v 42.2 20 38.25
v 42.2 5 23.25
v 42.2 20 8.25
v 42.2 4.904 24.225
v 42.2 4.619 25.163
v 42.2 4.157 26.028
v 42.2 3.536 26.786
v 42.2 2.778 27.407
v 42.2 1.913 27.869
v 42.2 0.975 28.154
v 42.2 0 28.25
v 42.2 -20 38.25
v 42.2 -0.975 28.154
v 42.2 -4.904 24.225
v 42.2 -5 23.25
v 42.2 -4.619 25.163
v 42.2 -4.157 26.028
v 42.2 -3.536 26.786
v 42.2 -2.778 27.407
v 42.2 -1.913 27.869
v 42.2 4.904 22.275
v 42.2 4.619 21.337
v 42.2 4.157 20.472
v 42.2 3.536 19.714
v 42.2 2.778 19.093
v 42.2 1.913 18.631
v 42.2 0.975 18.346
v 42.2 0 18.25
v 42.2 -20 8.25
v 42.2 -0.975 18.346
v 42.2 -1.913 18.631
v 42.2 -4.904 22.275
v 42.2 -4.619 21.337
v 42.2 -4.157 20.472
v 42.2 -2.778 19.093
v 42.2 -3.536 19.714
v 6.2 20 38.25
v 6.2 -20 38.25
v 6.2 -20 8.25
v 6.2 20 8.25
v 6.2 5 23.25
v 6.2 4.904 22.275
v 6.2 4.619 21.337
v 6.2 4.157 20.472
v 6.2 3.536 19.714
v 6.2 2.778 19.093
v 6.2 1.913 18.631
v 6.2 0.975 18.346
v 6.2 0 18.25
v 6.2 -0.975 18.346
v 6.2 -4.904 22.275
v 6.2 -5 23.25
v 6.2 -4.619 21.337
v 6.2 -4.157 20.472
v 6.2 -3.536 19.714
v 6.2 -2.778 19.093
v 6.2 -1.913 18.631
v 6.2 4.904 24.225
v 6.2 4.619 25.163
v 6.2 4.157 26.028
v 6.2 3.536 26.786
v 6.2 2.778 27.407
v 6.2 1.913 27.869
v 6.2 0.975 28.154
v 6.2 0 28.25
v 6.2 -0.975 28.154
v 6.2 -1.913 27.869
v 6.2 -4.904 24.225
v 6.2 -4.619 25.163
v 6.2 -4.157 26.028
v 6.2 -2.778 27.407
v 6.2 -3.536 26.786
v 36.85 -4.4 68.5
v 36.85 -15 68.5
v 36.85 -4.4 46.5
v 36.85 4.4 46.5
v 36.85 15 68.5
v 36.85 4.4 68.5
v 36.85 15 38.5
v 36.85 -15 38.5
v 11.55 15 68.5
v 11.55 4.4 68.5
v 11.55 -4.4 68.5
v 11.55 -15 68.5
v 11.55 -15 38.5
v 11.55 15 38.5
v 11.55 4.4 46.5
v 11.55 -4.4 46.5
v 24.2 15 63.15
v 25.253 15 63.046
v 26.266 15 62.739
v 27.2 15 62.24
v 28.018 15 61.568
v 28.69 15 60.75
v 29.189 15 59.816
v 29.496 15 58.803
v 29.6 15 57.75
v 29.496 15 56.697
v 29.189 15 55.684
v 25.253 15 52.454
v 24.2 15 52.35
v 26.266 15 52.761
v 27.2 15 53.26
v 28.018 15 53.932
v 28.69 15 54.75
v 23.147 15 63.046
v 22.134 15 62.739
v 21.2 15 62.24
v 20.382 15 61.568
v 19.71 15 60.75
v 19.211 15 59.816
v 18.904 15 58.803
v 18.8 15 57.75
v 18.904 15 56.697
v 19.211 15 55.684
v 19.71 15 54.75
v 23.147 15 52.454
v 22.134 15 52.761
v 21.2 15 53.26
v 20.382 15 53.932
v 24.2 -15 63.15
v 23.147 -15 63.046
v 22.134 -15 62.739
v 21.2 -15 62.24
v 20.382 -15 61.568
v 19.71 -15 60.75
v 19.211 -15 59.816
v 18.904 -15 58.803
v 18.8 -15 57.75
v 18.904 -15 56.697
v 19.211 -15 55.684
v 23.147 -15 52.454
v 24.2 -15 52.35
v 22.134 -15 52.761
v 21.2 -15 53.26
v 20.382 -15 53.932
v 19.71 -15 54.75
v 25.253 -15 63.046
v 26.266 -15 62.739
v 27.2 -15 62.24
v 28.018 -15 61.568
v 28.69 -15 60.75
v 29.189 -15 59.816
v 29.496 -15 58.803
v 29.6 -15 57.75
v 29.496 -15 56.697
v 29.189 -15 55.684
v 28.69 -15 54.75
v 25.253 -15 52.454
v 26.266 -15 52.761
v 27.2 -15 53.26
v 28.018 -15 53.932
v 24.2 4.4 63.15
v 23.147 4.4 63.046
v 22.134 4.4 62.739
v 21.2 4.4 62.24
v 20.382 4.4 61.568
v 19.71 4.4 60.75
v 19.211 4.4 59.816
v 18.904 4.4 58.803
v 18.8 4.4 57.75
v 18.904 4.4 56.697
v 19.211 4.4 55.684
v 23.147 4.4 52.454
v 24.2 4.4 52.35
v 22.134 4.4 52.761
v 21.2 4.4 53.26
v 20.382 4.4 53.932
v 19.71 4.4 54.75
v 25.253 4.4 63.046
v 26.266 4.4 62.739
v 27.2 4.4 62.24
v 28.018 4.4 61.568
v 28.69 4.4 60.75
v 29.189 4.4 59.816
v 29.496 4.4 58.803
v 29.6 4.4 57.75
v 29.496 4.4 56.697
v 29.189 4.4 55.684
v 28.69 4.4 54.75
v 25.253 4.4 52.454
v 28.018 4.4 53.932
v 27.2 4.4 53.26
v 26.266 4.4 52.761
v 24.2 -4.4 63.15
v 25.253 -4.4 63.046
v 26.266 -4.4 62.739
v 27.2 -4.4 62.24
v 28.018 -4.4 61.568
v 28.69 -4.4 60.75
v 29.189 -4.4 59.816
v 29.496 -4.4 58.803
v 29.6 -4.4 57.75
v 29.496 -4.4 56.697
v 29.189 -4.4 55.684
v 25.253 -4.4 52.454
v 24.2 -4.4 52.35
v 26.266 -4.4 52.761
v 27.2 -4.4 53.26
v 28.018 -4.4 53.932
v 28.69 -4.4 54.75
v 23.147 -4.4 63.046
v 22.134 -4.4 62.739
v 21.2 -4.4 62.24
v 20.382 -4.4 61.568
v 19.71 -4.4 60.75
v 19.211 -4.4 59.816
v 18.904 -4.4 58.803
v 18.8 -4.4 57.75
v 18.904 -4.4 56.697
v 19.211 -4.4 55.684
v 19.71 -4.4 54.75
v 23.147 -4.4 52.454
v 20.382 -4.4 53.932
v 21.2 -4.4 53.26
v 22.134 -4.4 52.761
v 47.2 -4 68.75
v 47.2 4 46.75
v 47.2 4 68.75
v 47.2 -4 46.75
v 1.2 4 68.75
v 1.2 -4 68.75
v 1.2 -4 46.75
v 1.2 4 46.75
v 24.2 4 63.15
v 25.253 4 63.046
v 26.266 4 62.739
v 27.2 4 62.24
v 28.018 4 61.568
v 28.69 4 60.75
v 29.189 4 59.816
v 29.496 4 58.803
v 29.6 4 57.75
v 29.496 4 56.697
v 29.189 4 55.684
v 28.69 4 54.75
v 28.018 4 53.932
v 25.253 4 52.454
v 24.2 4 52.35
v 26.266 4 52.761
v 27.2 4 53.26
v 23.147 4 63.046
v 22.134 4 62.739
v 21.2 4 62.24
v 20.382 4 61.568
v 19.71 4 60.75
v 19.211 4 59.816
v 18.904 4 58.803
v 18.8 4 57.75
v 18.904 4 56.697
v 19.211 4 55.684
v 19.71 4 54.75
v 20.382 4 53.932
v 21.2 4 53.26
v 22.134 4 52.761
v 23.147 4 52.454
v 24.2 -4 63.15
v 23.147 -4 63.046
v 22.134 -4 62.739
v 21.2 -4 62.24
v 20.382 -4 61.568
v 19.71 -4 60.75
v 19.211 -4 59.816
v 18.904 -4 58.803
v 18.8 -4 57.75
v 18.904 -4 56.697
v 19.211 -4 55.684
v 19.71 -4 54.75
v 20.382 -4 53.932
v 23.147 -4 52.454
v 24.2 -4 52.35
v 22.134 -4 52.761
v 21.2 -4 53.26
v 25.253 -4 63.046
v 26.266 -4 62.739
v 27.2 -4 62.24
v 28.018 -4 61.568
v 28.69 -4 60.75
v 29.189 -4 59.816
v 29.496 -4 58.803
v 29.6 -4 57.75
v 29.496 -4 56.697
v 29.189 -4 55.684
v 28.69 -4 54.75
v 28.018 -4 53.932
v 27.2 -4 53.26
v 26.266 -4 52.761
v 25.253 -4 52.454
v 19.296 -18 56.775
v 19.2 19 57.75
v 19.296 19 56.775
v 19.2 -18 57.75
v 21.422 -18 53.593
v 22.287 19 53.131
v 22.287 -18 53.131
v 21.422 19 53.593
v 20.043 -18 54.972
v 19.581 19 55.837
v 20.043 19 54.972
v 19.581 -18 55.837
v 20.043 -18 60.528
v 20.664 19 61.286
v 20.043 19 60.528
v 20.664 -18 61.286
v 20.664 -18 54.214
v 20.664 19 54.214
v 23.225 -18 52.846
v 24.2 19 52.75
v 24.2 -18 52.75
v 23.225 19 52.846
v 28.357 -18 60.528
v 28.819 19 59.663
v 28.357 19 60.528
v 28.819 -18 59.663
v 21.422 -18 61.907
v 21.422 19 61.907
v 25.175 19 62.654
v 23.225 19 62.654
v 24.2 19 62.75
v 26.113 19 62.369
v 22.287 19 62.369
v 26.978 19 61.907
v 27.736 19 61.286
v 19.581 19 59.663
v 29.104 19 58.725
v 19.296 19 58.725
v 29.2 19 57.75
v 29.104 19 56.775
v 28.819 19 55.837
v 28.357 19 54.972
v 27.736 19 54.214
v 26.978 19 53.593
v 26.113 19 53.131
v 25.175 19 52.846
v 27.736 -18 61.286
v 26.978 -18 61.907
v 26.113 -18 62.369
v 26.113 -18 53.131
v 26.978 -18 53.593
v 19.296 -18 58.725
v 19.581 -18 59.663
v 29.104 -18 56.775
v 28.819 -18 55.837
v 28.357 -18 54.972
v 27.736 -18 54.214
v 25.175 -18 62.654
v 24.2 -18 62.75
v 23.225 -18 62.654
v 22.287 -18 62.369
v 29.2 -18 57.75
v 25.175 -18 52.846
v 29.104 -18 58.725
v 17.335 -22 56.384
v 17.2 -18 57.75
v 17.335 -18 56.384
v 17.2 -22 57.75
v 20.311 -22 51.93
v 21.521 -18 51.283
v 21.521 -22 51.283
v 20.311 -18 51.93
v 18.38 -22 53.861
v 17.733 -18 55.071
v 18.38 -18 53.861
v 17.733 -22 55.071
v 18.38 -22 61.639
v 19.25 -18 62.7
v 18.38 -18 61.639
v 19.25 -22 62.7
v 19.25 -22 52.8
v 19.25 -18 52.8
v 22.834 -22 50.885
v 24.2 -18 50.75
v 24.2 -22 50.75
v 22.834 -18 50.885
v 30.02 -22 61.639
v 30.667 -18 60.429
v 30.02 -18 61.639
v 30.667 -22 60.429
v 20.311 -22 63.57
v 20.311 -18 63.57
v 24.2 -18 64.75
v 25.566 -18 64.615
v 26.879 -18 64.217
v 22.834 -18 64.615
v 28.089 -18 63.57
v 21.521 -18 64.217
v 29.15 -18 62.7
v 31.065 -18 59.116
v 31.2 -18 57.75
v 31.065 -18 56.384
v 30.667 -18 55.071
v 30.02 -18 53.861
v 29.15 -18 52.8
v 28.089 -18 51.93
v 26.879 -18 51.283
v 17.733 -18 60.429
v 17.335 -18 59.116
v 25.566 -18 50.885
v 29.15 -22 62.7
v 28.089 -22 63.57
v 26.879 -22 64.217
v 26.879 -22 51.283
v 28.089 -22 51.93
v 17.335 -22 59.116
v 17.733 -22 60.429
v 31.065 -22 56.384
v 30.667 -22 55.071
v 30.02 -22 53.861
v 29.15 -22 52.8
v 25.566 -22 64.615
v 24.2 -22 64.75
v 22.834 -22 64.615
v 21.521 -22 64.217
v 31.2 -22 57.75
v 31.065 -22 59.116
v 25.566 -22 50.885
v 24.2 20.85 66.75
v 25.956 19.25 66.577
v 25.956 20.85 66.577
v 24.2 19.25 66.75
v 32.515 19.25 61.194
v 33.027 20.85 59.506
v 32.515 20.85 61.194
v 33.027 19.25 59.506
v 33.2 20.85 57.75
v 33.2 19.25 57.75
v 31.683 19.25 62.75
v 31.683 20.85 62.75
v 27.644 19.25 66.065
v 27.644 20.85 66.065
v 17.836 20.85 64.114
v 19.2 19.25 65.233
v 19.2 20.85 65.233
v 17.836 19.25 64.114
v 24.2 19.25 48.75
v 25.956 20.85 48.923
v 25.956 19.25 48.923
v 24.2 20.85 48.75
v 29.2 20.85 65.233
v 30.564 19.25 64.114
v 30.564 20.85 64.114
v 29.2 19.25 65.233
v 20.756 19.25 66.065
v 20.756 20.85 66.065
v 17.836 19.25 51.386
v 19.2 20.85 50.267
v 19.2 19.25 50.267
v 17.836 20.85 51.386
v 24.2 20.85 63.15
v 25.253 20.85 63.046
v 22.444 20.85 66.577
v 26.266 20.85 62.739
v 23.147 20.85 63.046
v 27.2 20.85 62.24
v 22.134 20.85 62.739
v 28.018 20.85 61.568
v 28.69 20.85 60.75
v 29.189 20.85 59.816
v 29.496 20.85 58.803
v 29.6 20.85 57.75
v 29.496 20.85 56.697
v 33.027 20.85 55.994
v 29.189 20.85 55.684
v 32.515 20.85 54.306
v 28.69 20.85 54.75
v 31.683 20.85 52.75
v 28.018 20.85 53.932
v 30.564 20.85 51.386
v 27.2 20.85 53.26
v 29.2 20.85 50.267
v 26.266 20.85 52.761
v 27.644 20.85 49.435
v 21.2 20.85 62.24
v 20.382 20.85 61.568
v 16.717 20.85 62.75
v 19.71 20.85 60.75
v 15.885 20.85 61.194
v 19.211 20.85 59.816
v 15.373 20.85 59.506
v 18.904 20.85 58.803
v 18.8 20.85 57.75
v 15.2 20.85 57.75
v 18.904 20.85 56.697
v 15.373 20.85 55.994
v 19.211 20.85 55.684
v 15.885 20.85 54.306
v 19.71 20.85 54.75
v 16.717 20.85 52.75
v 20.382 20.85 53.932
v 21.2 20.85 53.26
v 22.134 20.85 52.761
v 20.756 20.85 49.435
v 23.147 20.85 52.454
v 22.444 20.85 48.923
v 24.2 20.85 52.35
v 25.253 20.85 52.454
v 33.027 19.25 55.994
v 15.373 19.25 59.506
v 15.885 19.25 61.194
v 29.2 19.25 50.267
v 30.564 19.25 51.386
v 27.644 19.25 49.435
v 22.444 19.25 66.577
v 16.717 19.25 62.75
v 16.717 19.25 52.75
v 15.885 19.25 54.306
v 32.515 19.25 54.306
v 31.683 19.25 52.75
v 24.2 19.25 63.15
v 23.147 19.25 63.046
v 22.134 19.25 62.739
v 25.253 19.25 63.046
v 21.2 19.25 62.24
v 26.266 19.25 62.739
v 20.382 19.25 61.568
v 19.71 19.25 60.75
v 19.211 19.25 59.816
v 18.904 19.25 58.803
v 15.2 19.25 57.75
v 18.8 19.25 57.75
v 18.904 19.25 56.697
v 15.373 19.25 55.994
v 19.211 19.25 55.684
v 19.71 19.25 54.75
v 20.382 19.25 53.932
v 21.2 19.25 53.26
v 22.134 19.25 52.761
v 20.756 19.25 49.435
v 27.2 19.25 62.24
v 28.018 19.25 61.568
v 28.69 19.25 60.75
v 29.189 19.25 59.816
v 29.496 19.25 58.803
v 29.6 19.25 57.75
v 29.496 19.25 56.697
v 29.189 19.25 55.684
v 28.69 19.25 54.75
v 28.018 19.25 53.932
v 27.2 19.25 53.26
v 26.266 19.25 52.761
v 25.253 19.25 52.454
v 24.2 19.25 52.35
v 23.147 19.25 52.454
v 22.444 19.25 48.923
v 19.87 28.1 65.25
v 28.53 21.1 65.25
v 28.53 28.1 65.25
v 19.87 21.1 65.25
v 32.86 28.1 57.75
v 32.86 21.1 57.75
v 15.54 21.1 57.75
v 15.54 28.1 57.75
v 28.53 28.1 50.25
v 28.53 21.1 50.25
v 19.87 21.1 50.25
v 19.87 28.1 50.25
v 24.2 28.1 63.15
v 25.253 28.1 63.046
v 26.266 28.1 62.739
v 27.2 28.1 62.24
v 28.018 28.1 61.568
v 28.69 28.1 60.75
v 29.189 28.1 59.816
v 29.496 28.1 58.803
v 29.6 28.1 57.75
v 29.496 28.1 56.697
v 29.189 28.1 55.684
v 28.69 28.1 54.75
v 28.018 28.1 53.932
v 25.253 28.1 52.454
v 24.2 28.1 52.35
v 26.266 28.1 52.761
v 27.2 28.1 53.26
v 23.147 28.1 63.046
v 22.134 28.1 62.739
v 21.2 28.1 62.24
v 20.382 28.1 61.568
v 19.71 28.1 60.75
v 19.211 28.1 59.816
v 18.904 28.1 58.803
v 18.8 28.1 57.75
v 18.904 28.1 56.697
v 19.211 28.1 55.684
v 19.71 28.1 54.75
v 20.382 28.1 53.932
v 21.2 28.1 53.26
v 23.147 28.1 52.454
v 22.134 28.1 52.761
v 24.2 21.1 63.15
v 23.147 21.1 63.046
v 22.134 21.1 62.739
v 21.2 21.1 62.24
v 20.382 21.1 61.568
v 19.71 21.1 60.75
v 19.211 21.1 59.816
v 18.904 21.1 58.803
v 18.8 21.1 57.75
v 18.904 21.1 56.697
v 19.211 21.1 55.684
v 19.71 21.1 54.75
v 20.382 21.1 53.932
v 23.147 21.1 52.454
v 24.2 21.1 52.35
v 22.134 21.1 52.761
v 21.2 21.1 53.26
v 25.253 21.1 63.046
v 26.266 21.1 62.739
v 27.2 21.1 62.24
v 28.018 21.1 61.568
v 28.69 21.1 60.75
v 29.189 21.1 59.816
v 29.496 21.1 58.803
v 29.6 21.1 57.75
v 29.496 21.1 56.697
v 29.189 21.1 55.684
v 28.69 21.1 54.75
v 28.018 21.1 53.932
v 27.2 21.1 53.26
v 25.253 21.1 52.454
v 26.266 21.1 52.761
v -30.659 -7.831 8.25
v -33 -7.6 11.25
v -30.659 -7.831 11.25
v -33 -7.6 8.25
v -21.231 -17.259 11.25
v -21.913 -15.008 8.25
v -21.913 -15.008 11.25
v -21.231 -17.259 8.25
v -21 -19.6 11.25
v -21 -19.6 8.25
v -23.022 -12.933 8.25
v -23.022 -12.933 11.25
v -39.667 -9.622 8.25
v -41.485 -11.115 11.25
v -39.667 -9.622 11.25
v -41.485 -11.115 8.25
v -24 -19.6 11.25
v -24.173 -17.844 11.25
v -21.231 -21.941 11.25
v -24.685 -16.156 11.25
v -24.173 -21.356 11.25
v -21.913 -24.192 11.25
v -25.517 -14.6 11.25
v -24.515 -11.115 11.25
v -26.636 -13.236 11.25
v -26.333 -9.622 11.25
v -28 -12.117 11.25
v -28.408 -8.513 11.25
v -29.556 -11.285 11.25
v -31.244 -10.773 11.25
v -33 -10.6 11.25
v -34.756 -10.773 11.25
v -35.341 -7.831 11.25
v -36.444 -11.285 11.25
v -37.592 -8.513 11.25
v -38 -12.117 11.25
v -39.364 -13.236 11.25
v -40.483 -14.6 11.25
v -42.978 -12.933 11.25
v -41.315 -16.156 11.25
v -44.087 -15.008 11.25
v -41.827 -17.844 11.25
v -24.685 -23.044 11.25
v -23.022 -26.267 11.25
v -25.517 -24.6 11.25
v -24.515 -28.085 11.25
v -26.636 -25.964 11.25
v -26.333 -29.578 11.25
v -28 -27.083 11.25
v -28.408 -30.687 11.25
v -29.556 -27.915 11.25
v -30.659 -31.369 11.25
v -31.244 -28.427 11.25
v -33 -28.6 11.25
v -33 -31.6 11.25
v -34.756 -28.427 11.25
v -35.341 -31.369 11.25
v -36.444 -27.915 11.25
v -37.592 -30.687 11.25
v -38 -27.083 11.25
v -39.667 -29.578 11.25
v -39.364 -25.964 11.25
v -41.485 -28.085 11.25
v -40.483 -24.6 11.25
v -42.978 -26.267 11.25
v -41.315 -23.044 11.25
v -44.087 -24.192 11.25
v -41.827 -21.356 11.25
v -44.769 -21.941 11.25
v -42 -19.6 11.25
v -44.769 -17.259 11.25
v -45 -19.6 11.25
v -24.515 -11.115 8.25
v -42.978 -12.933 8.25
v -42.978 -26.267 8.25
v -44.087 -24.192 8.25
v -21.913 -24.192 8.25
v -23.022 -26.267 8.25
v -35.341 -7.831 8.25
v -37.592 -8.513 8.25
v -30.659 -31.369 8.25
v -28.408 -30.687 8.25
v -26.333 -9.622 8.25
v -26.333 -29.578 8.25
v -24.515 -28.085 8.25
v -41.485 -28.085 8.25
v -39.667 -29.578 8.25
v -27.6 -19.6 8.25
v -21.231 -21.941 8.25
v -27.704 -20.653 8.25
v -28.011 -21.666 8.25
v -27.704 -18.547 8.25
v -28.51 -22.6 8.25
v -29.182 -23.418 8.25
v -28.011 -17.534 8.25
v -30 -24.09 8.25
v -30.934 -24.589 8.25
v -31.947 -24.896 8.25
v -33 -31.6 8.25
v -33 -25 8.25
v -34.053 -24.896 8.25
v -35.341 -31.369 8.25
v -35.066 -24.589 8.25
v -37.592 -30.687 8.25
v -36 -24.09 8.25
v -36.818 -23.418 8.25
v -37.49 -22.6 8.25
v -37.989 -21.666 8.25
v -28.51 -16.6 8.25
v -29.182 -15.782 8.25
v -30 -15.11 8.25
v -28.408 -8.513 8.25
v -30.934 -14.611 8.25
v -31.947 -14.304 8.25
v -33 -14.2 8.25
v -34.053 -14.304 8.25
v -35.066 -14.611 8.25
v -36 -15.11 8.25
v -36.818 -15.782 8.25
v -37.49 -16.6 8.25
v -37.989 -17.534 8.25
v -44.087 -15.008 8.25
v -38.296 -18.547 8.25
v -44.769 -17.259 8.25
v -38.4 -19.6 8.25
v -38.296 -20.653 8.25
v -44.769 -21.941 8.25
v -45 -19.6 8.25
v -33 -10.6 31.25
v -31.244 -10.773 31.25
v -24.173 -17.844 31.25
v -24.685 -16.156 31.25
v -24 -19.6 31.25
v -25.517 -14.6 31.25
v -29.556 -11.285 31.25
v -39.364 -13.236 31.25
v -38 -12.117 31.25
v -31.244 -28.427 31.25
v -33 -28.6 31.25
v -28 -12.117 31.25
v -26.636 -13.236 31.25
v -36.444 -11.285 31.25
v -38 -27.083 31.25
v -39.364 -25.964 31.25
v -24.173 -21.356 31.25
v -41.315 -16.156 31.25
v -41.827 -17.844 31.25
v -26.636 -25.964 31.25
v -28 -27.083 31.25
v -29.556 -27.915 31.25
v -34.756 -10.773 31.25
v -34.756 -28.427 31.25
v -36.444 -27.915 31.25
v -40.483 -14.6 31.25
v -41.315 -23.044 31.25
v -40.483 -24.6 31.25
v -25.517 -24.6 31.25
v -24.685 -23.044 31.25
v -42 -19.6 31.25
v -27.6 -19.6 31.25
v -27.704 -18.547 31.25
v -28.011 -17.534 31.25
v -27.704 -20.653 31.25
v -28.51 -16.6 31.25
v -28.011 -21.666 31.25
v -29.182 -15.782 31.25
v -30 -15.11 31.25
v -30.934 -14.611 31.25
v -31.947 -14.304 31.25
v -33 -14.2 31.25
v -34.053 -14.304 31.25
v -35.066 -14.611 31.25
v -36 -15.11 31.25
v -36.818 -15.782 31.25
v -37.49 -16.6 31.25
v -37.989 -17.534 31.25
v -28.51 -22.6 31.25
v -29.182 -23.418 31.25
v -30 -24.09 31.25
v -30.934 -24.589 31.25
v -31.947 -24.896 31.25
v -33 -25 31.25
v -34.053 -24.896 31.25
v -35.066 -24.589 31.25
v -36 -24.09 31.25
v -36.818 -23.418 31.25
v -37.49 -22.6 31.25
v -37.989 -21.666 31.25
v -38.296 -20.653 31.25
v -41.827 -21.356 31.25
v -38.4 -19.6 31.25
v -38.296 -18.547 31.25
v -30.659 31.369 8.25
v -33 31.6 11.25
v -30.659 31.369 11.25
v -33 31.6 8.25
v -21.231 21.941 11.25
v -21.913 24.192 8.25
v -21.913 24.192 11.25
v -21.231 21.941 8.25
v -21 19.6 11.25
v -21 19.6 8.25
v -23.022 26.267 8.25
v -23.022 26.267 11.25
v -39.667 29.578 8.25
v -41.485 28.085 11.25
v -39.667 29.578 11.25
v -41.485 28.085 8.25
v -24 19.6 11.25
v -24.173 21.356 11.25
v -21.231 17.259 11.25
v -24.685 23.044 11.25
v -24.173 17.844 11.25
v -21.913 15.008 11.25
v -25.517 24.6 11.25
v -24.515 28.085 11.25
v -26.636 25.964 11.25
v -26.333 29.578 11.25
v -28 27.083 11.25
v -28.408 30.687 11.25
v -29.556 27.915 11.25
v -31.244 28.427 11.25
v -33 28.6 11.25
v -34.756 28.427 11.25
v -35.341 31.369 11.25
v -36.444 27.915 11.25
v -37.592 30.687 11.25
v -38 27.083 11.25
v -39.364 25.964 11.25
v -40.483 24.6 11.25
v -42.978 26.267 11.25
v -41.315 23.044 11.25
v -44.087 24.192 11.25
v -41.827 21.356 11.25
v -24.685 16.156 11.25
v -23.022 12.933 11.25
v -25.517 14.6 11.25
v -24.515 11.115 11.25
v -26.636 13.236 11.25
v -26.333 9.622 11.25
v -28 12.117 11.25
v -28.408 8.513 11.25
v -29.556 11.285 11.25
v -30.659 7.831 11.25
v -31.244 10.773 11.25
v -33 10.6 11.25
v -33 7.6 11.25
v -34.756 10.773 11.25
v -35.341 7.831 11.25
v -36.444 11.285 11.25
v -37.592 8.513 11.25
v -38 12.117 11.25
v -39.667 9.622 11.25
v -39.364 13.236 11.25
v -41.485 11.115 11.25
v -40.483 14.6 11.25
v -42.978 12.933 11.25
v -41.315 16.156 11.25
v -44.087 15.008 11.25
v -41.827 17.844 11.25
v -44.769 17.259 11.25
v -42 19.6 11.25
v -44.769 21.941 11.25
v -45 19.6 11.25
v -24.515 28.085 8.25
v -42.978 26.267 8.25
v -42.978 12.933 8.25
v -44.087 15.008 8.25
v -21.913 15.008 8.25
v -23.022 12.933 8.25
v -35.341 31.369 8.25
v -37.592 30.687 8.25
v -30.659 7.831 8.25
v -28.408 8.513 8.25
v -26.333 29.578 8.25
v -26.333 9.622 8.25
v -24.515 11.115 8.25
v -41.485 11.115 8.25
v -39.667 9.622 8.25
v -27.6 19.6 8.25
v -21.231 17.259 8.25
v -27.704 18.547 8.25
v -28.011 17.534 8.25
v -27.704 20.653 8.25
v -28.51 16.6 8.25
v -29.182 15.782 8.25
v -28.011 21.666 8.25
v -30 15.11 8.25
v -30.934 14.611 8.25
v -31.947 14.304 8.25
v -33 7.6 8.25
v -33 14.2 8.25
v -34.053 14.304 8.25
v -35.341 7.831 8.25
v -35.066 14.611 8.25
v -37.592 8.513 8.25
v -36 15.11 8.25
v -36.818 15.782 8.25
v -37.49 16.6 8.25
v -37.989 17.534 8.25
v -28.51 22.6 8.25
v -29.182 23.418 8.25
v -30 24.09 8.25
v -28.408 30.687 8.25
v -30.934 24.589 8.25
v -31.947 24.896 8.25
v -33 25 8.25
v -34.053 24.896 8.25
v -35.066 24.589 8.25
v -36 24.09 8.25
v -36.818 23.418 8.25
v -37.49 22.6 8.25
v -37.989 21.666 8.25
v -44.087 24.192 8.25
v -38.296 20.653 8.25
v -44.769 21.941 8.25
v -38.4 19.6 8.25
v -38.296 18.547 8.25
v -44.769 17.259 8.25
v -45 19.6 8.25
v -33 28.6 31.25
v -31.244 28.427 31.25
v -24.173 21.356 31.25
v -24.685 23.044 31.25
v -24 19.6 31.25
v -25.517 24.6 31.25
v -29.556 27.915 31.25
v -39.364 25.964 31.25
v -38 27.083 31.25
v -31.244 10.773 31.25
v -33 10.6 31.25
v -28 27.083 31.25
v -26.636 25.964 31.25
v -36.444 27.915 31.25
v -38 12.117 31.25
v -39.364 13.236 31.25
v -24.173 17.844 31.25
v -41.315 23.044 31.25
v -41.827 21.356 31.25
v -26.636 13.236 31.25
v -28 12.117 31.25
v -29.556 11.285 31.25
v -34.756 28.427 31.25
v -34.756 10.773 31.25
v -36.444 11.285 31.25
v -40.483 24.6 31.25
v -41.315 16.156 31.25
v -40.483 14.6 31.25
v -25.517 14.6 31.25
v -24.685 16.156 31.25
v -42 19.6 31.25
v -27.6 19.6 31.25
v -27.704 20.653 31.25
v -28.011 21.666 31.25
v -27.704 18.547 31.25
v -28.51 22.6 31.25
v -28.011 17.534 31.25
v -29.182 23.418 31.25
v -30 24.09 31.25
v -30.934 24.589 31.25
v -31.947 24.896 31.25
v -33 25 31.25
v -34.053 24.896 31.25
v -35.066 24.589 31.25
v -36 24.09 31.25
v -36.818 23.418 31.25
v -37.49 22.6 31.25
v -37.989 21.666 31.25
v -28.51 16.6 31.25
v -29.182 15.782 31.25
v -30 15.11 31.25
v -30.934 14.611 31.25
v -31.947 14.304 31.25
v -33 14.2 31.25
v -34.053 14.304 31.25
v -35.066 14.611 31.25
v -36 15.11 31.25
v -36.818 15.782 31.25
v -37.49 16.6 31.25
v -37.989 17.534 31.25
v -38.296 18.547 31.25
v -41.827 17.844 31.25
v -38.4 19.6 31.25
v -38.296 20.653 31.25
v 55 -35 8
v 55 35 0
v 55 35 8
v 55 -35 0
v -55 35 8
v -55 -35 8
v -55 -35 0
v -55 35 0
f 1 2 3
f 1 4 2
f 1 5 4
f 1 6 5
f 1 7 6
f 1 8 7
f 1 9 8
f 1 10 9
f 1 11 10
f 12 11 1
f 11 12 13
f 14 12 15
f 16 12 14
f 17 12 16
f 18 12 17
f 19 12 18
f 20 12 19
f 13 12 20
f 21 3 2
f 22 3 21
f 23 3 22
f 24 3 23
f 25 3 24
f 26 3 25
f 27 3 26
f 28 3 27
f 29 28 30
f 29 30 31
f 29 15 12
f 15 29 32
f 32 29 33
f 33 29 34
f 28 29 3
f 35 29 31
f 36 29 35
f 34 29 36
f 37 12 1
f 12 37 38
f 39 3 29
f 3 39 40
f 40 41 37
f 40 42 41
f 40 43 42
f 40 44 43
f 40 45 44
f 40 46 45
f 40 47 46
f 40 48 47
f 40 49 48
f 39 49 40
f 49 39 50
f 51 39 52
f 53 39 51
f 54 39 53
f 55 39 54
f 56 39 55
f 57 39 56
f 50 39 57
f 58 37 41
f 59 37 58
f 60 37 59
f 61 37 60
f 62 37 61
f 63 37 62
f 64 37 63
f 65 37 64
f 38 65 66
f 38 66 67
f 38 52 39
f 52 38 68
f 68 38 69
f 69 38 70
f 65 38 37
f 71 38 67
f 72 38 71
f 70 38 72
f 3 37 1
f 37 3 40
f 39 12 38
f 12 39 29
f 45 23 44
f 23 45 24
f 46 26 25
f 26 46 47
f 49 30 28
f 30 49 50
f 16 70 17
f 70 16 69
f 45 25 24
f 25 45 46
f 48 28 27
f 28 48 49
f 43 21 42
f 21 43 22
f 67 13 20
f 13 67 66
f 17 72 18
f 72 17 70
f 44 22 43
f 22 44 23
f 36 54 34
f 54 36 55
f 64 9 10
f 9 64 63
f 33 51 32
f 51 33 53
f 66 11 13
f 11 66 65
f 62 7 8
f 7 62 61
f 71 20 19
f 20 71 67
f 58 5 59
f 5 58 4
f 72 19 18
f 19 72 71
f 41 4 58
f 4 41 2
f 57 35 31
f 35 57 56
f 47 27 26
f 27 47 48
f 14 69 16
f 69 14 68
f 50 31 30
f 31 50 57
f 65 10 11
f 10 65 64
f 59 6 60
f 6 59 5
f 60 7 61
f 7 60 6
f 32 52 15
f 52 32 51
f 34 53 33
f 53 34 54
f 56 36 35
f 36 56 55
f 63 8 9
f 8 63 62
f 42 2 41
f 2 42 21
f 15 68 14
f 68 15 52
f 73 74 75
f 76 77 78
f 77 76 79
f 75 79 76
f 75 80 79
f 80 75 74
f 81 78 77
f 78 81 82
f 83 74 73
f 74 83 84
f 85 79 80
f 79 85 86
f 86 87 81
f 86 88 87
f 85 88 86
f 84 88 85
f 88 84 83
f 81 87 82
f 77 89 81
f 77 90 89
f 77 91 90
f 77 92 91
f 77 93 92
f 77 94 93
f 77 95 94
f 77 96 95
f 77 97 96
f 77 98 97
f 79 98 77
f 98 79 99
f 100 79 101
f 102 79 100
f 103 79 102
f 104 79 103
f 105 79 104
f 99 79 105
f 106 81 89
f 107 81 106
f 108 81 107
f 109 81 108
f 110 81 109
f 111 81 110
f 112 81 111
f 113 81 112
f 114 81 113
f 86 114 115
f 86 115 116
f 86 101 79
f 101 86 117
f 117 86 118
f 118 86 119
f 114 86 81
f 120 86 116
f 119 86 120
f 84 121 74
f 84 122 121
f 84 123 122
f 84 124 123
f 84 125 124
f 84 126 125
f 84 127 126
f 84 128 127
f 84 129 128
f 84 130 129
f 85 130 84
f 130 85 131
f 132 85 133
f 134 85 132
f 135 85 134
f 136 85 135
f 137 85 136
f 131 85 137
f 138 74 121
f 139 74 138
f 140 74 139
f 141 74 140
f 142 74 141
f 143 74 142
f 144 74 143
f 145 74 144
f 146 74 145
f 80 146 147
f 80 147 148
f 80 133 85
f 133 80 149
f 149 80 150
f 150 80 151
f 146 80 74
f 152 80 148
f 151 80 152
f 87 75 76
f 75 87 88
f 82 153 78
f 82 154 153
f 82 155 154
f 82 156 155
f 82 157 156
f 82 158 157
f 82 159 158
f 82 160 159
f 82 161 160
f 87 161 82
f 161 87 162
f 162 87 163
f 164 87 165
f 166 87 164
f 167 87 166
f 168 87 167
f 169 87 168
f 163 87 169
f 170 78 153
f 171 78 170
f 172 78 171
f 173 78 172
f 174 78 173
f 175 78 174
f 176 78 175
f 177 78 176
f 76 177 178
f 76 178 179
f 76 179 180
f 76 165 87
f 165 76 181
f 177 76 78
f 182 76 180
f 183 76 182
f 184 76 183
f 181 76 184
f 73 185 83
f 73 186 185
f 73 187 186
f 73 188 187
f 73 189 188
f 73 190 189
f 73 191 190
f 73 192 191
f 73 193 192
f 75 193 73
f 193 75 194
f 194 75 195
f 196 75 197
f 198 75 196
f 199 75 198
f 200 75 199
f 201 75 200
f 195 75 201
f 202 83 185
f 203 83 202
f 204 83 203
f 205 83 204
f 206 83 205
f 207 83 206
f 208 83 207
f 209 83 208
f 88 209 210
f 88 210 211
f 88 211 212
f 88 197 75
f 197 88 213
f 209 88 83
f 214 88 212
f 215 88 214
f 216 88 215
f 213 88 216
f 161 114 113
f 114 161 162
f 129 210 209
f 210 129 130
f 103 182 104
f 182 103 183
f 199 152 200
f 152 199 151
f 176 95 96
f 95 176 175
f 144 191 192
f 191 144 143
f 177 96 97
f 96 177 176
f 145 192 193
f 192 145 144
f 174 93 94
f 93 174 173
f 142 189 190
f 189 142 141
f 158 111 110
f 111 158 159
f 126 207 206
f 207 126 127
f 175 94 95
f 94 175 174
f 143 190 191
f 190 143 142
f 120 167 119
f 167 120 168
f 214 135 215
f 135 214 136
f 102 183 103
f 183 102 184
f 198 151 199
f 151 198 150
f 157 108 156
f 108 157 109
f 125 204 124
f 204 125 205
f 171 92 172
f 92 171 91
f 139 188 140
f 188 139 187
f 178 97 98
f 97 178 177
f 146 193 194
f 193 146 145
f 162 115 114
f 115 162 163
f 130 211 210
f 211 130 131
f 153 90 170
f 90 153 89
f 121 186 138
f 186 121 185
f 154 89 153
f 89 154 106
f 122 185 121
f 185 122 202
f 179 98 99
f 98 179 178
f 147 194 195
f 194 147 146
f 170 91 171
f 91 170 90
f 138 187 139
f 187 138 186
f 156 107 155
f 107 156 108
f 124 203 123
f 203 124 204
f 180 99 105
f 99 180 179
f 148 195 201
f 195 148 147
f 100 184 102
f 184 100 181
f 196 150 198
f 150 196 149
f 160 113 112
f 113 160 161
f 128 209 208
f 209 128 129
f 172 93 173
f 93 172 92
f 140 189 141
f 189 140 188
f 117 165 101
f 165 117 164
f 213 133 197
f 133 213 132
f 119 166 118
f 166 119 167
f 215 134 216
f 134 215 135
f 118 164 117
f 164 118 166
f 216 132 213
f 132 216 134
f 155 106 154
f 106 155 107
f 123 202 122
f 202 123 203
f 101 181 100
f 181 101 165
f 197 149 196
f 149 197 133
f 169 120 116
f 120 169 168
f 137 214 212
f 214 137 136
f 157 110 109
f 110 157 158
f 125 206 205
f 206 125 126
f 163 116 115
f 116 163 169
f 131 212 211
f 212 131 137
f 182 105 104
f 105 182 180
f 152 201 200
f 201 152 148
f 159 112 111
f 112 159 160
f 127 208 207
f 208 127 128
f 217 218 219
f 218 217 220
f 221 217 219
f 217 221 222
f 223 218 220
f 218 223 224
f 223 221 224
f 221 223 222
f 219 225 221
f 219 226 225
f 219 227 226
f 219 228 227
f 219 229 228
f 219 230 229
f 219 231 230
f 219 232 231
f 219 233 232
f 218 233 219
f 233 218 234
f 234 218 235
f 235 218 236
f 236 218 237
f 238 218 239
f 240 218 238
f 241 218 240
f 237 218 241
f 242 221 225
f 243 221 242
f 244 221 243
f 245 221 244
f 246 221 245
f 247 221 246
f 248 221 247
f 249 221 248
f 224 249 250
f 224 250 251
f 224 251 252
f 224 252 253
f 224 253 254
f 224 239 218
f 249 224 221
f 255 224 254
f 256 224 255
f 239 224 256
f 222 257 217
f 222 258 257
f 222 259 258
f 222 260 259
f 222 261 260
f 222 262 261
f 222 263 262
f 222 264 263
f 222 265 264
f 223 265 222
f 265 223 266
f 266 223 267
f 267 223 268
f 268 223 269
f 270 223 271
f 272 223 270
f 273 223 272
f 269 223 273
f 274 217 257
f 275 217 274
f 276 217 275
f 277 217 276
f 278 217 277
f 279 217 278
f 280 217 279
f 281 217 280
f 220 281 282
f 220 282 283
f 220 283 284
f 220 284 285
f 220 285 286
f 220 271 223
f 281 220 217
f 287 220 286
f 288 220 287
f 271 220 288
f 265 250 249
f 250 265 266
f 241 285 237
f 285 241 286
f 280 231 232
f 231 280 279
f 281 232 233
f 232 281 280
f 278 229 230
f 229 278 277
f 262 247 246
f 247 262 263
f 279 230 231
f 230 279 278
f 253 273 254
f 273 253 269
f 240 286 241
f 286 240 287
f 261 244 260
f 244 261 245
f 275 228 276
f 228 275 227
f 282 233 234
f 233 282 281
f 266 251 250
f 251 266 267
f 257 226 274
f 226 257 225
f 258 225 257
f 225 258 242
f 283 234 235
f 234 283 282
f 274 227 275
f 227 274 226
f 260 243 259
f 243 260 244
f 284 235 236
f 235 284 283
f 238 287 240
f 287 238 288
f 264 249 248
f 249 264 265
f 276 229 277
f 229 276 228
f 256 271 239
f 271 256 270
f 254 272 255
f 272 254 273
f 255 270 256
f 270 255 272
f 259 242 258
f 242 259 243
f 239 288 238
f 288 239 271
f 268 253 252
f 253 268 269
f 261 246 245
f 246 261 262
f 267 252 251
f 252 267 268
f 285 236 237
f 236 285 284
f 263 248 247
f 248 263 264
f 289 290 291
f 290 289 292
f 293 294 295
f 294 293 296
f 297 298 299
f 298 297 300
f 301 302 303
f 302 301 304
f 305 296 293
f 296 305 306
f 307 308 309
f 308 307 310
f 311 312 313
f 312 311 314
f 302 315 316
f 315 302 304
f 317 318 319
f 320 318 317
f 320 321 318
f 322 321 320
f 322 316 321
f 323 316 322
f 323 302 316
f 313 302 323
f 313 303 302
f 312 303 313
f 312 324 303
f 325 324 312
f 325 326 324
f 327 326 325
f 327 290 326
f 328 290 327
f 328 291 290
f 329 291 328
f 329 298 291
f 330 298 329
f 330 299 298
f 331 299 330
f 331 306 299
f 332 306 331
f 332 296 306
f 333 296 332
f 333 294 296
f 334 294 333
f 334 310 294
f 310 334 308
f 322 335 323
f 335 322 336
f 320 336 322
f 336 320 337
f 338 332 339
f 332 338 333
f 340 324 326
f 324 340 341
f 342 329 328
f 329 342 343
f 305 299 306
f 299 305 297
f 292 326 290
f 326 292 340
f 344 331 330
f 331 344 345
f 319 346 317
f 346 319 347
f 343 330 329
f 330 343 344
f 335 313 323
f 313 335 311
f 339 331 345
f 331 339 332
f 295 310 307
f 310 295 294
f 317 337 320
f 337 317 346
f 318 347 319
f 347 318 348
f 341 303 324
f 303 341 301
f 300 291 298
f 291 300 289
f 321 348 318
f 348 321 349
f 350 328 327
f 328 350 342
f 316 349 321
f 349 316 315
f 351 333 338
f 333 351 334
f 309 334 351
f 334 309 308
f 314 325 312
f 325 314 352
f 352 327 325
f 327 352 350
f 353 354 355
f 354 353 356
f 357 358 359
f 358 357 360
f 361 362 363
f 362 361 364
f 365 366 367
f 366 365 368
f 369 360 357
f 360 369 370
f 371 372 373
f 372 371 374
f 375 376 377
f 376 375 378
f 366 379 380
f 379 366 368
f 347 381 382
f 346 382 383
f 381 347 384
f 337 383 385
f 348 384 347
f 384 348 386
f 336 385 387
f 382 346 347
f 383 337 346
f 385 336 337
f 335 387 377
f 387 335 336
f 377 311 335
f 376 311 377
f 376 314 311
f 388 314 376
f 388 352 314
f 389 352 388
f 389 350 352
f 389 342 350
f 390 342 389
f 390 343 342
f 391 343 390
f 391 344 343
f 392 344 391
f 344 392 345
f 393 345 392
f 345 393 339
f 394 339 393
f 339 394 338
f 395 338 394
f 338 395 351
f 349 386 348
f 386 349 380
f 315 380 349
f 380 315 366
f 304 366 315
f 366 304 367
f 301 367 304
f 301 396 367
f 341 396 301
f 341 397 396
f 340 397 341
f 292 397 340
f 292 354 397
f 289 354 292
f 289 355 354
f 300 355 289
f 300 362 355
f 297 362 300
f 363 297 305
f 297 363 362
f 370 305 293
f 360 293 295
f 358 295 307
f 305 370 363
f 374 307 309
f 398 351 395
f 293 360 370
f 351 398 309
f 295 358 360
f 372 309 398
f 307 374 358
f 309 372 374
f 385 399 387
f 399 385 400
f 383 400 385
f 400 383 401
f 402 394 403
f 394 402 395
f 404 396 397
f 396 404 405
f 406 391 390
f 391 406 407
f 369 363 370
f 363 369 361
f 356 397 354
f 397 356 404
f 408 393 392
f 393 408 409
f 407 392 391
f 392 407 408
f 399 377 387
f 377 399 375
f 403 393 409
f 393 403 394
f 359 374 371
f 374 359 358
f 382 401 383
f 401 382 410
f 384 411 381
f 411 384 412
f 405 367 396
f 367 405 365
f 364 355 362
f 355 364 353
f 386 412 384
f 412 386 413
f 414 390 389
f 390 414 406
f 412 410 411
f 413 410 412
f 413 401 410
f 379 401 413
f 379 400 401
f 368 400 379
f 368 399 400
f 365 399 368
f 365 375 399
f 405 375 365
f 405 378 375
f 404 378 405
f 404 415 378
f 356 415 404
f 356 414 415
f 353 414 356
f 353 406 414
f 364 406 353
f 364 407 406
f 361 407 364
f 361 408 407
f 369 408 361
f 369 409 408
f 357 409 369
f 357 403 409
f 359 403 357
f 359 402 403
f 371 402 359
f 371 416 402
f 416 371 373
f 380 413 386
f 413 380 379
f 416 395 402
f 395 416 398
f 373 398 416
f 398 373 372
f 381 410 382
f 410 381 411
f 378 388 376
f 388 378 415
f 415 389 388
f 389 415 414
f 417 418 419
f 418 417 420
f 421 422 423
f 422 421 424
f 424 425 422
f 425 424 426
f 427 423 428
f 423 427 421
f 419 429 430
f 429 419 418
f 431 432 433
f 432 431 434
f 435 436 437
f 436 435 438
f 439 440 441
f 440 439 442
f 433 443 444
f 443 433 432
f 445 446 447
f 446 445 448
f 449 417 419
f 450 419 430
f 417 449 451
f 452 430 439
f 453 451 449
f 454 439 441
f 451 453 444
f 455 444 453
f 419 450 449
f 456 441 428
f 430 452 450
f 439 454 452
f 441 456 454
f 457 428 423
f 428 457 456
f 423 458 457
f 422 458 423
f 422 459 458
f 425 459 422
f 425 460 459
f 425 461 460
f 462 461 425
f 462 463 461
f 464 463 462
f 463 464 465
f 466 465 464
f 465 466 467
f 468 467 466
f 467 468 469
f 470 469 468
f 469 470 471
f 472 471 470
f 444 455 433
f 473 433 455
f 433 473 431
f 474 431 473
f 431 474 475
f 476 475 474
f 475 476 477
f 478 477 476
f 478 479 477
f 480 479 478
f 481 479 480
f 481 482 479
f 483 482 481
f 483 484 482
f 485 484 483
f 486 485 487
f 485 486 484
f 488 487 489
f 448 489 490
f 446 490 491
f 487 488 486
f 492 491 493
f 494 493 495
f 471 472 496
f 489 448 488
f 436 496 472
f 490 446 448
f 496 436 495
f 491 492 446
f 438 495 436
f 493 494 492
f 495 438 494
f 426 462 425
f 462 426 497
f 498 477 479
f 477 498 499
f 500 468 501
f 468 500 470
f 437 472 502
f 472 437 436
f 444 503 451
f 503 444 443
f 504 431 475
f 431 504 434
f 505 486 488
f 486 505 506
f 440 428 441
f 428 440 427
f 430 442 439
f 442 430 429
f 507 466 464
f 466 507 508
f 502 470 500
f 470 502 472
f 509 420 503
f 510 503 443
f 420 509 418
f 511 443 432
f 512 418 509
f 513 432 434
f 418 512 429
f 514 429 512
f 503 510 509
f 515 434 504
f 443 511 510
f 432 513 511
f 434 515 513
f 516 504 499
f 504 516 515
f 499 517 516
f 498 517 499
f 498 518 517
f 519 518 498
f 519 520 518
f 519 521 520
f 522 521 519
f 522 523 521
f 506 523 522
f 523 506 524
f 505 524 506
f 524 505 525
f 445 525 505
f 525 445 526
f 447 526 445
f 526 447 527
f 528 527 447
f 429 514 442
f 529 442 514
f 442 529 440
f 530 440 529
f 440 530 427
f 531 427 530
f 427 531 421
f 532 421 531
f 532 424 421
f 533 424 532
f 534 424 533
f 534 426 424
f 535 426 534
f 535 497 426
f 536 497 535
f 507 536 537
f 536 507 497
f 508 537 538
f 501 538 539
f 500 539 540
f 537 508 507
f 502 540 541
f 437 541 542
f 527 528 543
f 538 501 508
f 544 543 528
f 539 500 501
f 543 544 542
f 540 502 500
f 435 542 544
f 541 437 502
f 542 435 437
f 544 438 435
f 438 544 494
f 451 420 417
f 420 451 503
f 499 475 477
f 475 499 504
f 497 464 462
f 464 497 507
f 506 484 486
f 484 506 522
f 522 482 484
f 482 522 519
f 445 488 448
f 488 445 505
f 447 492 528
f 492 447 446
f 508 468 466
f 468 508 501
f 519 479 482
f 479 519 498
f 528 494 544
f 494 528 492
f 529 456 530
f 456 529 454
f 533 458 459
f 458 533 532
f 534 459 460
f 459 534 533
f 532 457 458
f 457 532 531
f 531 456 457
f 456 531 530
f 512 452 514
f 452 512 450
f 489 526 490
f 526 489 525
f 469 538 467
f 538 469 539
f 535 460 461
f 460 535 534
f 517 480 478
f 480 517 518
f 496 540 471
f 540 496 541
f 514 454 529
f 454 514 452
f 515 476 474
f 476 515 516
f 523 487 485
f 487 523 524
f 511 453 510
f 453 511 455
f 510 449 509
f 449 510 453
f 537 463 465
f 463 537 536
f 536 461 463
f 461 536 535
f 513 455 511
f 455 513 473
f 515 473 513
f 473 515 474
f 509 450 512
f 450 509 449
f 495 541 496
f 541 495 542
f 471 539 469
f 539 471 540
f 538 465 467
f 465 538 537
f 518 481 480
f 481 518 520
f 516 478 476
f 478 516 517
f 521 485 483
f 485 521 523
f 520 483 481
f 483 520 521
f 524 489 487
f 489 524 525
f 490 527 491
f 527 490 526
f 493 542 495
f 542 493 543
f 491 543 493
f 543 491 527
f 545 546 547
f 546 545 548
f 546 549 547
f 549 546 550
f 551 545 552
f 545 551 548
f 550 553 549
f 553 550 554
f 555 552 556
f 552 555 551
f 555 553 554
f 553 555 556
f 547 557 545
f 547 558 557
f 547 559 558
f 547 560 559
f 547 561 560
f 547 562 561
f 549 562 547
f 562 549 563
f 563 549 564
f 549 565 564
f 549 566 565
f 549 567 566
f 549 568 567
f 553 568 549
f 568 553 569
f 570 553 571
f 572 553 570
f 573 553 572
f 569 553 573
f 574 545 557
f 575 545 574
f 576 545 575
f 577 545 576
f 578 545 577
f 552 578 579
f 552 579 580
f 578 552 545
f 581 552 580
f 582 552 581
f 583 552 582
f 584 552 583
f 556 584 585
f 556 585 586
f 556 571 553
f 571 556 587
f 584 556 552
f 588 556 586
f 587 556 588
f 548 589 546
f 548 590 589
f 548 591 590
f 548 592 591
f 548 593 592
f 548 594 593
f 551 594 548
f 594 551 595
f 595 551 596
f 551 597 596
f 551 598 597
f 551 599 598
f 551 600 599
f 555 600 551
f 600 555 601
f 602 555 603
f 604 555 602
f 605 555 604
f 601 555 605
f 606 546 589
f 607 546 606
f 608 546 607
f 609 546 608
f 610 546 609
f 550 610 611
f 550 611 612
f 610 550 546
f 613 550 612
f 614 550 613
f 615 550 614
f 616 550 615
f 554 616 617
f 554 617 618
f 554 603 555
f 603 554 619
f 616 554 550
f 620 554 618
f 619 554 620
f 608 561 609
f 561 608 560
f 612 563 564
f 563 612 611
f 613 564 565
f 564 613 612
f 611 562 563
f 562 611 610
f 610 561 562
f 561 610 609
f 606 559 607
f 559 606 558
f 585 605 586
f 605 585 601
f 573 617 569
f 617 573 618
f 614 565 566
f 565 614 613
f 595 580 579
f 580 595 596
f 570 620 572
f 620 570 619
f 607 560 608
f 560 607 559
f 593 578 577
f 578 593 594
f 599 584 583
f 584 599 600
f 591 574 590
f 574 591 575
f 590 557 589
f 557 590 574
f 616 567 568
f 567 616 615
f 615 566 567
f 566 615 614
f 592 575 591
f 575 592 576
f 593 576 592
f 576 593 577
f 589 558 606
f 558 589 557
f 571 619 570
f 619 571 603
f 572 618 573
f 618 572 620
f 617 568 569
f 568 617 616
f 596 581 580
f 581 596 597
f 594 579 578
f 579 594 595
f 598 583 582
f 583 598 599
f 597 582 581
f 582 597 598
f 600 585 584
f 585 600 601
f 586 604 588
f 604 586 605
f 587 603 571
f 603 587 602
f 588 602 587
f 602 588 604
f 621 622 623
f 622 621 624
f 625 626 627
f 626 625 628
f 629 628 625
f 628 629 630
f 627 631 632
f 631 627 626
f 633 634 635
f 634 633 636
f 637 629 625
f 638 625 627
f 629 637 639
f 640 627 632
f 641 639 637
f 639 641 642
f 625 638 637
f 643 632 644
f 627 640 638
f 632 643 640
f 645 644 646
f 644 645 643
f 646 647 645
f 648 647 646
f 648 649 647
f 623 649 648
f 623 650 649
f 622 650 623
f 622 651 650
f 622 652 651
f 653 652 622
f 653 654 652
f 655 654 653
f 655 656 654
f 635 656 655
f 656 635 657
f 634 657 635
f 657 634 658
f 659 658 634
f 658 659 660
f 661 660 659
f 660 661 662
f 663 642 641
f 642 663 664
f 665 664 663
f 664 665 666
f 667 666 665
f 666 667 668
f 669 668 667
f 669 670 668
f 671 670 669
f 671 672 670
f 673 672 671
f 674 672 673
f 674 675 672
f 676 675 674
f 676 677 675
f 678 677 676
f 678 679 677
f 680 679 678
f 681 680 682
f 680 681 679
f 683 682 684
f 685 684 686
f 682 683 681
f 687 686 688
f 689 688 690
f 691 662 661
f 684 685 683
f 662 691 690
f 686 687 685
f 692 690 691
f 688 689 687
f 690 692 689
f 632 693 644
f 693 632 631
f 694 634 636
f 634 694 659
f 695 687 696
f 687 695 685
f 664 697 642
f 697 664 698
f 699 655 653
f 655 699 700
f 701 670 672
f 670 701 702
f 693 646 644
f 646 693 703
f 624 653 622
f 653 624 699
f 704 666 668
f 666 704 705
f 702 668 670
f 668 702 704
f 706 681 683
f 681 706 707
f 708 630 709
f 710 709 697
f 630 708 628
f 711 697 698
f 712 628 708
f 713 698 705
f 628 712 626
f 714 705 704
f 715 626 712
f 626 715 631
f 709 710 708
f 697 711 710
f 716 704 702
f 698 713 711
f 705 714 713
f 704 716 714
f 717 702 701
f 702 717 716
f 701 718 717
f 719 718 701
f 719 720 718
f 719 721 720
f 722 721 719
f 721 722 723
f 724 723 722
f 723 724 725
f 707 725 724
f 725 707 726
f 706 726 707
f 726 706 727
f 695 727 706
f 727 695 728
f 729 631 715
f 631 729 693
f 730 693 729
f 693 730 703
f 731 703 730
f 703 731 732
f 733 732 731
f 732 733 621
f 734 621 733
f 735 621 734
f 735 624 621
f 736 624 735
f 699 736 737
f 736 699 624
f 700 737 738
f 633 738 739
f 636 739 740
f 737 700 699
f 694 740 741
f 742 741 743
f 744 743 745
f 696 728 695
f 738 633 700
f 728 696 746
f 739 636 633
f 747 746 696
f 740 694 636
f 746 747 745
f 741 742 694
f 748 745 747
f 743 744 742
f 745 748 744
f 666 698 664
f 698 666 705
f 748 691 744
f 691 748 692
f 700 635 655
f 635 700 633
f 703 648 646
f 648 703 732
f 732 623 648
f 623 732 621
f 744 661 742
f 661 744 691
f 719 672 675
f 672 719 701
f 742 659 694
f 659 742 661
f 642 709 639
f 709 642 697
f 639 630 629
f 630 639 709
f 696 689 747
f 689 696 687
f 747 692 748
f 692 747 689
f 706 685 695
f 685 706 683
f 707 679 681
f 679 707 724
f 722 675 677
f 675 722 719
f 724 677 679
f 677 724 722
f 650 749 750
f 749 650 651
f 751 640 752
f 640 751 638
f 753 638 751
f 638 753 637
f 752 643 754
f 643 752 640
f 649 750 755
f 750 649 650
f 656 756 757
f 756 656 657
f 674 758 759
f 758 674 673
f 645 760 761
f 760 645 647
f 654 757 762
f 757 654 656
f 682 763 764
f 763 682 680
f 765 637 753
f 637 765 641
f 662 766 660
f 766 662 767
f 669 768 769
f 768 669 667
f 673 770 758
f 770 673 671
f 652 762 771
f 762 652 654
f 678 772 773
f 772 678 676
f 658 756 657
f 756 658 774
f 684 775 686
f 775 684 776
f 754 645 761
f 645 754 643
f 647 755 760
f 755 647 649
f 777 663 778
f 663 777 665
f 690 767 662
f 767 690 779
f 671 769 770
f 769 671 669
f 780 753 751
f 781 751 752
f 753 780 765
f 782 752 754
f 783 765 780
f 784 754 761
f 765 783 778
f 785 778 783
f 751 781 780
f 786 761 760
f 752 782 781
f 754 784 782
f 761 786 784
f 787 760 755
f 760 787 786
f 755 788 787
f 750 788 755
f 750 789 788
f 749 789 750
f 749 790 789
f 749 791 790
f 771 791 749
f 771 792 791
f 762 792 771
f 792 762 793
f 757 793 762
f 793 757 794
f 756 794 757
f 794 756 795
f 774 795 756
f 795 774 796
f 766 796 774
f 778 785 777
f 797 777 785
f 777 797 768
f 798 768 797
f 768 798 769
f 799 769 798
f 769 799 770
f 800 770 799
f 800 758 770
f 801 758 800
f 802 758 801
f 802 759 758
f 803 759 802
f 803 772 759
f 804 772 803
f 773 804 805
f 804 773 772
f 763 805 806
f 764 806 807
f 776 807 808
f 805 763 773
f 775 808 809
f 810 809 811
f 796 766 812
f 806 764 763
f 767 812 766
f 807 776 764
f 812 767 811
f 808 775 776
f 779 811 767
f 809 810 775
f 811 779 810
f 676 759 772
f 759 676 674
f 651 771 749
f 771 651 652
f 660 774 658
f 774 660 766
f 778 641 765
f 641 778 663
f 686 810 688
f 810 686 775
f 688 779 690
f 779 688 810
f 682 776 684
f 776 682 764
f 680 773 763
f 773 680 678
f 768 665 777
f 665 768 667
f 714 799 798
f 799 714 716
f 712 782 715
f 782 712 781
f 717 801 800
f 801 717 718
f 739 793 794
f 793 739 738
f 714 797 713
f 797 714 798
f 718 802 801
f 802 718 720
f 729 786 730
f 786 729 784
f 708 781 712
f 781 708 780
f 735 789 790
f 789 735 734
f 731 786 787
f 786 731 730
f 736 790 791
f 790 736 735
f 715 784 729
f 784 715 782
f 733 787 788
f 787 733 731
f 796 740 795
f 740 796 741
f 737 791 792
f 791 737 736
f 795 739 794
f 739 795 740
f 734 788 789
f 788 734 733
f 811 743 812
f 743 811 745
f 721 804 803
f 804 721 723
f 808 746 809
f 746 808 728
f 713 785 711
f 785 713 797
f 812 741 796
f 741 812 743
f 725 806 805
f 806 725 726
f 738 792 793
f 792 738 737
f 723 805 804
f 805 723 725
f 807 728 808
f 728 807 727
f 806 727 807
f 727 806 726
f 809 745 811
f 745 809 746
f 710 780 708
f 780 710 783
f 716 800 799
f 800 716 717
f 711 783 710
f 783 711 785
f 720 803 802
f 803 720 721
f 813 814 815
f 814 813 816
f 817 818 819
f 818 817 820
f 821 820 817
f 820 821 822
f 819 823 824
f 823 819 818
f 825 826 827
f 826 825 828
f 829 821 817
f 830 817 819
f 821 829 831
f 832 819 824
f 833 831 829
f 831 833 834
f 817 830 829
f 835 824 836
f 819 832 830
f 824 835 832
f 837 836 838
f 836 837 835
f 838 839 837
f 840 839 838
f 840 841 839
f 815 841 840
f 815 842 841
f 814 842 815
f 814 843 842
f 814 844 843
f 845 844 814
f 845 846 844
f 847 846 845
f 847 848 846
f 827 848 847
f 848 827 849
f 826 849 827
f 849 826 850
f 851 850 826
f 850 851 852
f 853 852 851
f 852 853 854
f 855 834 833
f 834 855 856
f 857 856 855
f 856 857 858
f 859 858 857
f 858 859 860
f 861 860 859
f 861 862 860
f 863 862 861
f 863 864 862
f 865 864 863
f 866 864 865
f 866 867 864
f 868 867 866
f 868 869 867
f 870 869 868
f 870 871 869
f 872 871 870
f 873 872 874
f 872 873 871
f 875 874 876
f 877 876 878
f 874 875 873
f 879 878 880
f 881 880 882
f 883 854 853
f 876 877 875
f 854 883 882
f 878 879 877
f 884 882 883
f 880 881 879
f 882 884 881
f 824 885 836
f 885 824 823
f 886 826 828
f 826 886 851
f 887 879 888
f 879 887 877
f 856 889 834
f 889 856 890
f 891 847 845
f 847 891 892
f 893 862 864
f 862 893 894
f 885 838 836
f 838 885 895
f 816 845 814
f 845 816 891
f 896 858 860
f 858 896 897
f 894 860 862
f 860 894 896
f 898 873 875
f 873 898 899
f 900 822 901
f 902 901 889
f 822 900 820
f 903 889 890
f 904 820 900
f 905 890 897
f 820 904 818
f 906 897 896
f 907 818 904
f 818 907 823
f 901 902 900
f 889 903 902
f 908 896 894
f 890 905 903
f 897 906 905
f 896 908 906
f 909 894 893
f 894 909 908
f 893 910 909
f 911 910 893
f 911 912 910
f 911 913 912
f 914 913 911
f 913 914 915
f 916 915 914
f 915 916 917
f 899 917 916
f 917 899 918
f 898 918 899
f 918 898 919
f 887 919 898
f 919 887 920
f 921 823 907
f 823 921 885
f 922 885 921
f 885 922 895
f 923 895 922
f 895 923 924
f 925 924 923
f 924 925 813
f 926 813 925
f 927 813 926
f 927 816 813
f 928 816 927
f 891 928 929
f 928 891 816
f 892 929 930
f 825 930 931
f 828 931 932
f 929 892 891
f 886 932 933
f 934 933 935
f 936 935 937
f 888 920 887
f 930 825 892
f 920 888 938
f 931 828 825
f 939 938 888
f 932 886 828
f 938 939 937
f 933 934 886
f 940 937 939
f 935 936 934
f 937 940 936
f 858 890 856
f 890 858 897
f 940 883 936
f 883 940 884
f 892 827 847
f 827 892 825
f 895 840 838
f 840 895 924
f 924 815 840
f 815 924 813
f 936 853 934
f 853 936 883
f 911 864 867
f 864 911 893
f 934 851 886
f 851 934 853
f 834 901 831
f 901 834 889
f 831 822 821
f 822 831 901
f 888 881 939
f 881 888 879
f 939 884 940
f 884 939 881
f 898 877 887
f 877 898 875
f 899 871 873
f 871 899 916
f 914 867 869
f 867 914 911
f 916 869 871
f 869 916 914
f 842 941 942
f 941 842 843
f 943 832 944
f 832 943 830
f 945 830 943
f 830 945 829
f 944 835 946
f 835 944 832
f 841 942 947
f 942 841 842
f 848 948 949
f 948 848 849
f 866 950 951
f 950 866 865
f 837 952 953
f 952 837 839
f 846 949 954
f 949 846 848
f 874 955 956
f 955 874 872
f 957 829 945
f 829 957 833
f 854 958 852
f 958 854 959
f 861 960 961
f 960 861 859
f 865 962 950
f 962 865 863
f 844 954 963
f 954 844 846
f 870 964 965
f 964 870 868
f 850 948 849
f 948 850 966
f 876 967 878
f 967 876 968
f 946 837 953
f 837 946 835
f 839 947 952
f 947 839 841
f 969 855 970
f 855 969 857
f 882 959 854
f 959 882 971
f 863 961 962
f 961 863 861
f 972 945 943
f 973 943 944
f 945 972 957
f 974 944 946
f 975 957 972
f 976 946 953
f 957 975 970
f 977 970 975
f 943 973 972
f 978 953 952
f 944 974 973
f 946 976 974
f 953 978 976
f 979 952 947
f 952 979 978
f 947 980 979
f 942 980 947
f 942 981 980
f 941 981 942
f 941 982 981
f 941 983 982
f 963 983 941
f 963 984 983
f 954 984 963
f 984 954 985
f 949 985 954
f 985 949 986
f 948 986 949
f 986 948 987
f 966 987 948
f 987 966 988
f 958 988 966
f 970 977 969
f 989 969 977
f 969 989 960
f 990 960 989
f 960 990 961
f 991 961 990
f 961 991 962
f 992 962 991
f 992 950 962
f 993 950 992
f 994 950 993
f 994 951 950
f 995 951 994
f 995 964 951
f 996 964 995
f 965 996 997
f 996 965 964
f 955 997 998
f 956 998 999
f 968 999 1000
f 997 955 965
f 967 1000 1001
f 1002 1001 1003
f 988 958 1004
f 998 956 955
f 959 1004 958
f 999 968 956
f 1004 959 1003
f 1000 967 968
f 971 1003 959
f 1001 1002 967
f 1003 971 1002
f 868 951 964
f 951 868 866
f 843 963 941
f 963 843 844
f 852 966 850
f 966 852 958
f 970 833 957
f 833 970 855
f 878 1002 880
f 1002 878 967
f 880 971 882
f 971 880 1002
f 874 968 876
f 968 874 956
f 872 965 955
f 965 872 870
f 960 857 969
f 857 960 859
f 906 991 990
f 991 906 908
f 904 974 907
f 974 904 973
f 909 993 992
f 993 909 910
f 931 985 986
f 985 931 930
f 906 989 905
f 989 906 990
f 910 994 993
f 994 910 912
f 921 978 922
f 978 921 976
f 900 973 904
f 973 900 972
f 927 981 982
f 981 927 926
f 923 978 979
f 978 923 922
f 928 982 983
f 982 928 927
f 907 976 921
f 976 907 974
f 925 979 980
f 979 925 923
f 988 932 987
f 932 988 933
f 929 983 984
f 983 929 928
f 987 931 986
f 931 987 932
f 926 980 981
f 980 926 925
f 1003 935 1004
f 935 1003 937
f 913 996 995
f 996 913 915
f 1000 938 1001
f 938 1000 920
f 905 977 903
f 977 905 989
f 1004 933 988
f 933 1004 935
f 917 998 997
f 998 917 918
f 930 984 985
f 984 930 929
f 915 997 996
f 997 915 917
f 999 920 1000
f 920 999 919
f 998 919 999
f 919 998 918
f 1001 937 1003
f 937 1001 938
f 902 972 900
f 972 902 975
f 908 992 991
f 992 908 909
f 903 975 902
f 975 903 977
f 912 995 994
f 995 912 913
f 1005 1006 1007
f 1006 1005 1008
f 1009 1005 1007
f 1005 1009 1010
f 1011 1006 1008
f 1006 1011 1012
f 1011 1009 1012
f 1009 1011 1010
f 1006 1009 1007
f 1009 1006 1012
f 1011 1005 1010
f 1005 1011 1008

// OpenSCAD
$fn = 32;

// ------------------------------------------------------------------------
// Indexing jig: plate 110 x 70 mm, pin d10
// Every part is its own module, assembly() places every instance.
// ------------------------------------------------------------------------

// --- part 1 ---
module jig_plate() {
  difference() {
    translate([-55, -35, 0]) cube([110, 70, 8]);
  }
}

// --- part 2 ---
module locator_block() {
  difference() {
    translate([-18, -20, 0]) cube([36, 40, 30]);
    translate([0, 0, 15]) rotate([0, 90, 0]) cylinder(h = 38, d = 10, center = true);
  }
}

// --- part 3 ---
module index_fork() {
  difference() {
    translate([-12.65, -15, 0]) cube([25.3, 30, 30]);
    translate([-13.65, -4.4, 8]) cube([27.3, 8.8, 23]);
    translate([0, 0, 19.25]) rotate([90, 0, 0]) cylinder(h = 32, d = 10.8, center = true);
  }
}

// --- part 4 ---
module index_arm() {
  difference() {
    translate([-23, -4, 0]) cube([46, 8, 22]);
    translate([0, 0, 11]) rotate([90, 0, 0]) cylinder(h = 10, d = 10.8, center = true);
  }
}

// --- part 5 ---
module index_pin() {
  rotate([0, 90, 0]) cylinder(h = 38, d = 10, center = true);
  translate([-22, 0, 0]) rotate([0, 90, 0]) cylinder(h = 4, d = 14);
}

// --- part 6 ---
module pin_washer() {
  difference() {
      translate([0, 0, 0]) cylinder(h = 1.6, d = 18);
      translate([0, 0, -1]) cylinder(h = 3.6, d = 10.8);
    }
}

// --- part 7 ---
module lock_nut() {
  difference() {
    linear_extrude(height = 7) polygon(points = [[8.66, 0], [4.33, 7.5], [-4.33, 7.5], [-8.66, 0], [-4.33, -7.5], [4.33, -7.5]]);
    translate([0, 0, -1]) cylinder(h = 9, d = 10.8);
  }
}

// --- part 8 ---
module guide_bush_a() {
  difference() {
    union() {
      cylinder(h = 3, d = 24);
      translate([0, 0, 3]) cylinder(h = 20, d = 18);
    }
    translate([0, 0, -1]) cylinder(h = 25, d = 10.8);
  }
}

// --- part 9 ---
module guide_bush_b() {
  difference() {
    union() {
      cylinder(h = 3, d = 24);
      translate([0, 0, 3]) cylinder(h = 20, d = 18);
    }
    translate([0, 0, -1]) cylinder(h = 25, d = 10.8);
  }
}

// --- assembly ---
module assembly() {
  color([0.80, 0.24, 0.20]) translate([0, 0, 0]) rotate([0, 0, 0]) jig_plate();
  color([0.20, 0.45, 0.75]) translate([24.2, 0, 8.25]) rotate([0, 0, 0]) locator_block();
  color([0.25, 0.62, 0.32]) translate([24.2, 0, 38.5]) rotate([0, 0, 0]) index_fork();
  color([0.92, 0.70, 0.18]) translate([24.2, 0, 46.75]) rotate([0, 0, 0]) index_arm();
  color([0.58, 0.35, 0.70]) translate([24.2, 0, 57.75]) rotate([0, 0, 90]) index_pin();
  color([0.16, 0.66, 0.66]) translate([24.2, 20.85, 57.75]) rotate([90, 0, 0]) pin_washer();
  color([0.85, 0.48, 0.18]) translate([24.2, 28.1, 57.75]) rotate([90, 0, 0]) lock_nut();
  color([0.55, 0.60, 0.65]) translate([-33, -19.6, 8.25]) rotate([0, 0, 0]) guide_bush_a();
  color([0.75, 0.30, 0.55]) translate([-33, 19.6, 8.25]) rotate([0, 0, 0]) guide_bush_b();
}

assembly();
